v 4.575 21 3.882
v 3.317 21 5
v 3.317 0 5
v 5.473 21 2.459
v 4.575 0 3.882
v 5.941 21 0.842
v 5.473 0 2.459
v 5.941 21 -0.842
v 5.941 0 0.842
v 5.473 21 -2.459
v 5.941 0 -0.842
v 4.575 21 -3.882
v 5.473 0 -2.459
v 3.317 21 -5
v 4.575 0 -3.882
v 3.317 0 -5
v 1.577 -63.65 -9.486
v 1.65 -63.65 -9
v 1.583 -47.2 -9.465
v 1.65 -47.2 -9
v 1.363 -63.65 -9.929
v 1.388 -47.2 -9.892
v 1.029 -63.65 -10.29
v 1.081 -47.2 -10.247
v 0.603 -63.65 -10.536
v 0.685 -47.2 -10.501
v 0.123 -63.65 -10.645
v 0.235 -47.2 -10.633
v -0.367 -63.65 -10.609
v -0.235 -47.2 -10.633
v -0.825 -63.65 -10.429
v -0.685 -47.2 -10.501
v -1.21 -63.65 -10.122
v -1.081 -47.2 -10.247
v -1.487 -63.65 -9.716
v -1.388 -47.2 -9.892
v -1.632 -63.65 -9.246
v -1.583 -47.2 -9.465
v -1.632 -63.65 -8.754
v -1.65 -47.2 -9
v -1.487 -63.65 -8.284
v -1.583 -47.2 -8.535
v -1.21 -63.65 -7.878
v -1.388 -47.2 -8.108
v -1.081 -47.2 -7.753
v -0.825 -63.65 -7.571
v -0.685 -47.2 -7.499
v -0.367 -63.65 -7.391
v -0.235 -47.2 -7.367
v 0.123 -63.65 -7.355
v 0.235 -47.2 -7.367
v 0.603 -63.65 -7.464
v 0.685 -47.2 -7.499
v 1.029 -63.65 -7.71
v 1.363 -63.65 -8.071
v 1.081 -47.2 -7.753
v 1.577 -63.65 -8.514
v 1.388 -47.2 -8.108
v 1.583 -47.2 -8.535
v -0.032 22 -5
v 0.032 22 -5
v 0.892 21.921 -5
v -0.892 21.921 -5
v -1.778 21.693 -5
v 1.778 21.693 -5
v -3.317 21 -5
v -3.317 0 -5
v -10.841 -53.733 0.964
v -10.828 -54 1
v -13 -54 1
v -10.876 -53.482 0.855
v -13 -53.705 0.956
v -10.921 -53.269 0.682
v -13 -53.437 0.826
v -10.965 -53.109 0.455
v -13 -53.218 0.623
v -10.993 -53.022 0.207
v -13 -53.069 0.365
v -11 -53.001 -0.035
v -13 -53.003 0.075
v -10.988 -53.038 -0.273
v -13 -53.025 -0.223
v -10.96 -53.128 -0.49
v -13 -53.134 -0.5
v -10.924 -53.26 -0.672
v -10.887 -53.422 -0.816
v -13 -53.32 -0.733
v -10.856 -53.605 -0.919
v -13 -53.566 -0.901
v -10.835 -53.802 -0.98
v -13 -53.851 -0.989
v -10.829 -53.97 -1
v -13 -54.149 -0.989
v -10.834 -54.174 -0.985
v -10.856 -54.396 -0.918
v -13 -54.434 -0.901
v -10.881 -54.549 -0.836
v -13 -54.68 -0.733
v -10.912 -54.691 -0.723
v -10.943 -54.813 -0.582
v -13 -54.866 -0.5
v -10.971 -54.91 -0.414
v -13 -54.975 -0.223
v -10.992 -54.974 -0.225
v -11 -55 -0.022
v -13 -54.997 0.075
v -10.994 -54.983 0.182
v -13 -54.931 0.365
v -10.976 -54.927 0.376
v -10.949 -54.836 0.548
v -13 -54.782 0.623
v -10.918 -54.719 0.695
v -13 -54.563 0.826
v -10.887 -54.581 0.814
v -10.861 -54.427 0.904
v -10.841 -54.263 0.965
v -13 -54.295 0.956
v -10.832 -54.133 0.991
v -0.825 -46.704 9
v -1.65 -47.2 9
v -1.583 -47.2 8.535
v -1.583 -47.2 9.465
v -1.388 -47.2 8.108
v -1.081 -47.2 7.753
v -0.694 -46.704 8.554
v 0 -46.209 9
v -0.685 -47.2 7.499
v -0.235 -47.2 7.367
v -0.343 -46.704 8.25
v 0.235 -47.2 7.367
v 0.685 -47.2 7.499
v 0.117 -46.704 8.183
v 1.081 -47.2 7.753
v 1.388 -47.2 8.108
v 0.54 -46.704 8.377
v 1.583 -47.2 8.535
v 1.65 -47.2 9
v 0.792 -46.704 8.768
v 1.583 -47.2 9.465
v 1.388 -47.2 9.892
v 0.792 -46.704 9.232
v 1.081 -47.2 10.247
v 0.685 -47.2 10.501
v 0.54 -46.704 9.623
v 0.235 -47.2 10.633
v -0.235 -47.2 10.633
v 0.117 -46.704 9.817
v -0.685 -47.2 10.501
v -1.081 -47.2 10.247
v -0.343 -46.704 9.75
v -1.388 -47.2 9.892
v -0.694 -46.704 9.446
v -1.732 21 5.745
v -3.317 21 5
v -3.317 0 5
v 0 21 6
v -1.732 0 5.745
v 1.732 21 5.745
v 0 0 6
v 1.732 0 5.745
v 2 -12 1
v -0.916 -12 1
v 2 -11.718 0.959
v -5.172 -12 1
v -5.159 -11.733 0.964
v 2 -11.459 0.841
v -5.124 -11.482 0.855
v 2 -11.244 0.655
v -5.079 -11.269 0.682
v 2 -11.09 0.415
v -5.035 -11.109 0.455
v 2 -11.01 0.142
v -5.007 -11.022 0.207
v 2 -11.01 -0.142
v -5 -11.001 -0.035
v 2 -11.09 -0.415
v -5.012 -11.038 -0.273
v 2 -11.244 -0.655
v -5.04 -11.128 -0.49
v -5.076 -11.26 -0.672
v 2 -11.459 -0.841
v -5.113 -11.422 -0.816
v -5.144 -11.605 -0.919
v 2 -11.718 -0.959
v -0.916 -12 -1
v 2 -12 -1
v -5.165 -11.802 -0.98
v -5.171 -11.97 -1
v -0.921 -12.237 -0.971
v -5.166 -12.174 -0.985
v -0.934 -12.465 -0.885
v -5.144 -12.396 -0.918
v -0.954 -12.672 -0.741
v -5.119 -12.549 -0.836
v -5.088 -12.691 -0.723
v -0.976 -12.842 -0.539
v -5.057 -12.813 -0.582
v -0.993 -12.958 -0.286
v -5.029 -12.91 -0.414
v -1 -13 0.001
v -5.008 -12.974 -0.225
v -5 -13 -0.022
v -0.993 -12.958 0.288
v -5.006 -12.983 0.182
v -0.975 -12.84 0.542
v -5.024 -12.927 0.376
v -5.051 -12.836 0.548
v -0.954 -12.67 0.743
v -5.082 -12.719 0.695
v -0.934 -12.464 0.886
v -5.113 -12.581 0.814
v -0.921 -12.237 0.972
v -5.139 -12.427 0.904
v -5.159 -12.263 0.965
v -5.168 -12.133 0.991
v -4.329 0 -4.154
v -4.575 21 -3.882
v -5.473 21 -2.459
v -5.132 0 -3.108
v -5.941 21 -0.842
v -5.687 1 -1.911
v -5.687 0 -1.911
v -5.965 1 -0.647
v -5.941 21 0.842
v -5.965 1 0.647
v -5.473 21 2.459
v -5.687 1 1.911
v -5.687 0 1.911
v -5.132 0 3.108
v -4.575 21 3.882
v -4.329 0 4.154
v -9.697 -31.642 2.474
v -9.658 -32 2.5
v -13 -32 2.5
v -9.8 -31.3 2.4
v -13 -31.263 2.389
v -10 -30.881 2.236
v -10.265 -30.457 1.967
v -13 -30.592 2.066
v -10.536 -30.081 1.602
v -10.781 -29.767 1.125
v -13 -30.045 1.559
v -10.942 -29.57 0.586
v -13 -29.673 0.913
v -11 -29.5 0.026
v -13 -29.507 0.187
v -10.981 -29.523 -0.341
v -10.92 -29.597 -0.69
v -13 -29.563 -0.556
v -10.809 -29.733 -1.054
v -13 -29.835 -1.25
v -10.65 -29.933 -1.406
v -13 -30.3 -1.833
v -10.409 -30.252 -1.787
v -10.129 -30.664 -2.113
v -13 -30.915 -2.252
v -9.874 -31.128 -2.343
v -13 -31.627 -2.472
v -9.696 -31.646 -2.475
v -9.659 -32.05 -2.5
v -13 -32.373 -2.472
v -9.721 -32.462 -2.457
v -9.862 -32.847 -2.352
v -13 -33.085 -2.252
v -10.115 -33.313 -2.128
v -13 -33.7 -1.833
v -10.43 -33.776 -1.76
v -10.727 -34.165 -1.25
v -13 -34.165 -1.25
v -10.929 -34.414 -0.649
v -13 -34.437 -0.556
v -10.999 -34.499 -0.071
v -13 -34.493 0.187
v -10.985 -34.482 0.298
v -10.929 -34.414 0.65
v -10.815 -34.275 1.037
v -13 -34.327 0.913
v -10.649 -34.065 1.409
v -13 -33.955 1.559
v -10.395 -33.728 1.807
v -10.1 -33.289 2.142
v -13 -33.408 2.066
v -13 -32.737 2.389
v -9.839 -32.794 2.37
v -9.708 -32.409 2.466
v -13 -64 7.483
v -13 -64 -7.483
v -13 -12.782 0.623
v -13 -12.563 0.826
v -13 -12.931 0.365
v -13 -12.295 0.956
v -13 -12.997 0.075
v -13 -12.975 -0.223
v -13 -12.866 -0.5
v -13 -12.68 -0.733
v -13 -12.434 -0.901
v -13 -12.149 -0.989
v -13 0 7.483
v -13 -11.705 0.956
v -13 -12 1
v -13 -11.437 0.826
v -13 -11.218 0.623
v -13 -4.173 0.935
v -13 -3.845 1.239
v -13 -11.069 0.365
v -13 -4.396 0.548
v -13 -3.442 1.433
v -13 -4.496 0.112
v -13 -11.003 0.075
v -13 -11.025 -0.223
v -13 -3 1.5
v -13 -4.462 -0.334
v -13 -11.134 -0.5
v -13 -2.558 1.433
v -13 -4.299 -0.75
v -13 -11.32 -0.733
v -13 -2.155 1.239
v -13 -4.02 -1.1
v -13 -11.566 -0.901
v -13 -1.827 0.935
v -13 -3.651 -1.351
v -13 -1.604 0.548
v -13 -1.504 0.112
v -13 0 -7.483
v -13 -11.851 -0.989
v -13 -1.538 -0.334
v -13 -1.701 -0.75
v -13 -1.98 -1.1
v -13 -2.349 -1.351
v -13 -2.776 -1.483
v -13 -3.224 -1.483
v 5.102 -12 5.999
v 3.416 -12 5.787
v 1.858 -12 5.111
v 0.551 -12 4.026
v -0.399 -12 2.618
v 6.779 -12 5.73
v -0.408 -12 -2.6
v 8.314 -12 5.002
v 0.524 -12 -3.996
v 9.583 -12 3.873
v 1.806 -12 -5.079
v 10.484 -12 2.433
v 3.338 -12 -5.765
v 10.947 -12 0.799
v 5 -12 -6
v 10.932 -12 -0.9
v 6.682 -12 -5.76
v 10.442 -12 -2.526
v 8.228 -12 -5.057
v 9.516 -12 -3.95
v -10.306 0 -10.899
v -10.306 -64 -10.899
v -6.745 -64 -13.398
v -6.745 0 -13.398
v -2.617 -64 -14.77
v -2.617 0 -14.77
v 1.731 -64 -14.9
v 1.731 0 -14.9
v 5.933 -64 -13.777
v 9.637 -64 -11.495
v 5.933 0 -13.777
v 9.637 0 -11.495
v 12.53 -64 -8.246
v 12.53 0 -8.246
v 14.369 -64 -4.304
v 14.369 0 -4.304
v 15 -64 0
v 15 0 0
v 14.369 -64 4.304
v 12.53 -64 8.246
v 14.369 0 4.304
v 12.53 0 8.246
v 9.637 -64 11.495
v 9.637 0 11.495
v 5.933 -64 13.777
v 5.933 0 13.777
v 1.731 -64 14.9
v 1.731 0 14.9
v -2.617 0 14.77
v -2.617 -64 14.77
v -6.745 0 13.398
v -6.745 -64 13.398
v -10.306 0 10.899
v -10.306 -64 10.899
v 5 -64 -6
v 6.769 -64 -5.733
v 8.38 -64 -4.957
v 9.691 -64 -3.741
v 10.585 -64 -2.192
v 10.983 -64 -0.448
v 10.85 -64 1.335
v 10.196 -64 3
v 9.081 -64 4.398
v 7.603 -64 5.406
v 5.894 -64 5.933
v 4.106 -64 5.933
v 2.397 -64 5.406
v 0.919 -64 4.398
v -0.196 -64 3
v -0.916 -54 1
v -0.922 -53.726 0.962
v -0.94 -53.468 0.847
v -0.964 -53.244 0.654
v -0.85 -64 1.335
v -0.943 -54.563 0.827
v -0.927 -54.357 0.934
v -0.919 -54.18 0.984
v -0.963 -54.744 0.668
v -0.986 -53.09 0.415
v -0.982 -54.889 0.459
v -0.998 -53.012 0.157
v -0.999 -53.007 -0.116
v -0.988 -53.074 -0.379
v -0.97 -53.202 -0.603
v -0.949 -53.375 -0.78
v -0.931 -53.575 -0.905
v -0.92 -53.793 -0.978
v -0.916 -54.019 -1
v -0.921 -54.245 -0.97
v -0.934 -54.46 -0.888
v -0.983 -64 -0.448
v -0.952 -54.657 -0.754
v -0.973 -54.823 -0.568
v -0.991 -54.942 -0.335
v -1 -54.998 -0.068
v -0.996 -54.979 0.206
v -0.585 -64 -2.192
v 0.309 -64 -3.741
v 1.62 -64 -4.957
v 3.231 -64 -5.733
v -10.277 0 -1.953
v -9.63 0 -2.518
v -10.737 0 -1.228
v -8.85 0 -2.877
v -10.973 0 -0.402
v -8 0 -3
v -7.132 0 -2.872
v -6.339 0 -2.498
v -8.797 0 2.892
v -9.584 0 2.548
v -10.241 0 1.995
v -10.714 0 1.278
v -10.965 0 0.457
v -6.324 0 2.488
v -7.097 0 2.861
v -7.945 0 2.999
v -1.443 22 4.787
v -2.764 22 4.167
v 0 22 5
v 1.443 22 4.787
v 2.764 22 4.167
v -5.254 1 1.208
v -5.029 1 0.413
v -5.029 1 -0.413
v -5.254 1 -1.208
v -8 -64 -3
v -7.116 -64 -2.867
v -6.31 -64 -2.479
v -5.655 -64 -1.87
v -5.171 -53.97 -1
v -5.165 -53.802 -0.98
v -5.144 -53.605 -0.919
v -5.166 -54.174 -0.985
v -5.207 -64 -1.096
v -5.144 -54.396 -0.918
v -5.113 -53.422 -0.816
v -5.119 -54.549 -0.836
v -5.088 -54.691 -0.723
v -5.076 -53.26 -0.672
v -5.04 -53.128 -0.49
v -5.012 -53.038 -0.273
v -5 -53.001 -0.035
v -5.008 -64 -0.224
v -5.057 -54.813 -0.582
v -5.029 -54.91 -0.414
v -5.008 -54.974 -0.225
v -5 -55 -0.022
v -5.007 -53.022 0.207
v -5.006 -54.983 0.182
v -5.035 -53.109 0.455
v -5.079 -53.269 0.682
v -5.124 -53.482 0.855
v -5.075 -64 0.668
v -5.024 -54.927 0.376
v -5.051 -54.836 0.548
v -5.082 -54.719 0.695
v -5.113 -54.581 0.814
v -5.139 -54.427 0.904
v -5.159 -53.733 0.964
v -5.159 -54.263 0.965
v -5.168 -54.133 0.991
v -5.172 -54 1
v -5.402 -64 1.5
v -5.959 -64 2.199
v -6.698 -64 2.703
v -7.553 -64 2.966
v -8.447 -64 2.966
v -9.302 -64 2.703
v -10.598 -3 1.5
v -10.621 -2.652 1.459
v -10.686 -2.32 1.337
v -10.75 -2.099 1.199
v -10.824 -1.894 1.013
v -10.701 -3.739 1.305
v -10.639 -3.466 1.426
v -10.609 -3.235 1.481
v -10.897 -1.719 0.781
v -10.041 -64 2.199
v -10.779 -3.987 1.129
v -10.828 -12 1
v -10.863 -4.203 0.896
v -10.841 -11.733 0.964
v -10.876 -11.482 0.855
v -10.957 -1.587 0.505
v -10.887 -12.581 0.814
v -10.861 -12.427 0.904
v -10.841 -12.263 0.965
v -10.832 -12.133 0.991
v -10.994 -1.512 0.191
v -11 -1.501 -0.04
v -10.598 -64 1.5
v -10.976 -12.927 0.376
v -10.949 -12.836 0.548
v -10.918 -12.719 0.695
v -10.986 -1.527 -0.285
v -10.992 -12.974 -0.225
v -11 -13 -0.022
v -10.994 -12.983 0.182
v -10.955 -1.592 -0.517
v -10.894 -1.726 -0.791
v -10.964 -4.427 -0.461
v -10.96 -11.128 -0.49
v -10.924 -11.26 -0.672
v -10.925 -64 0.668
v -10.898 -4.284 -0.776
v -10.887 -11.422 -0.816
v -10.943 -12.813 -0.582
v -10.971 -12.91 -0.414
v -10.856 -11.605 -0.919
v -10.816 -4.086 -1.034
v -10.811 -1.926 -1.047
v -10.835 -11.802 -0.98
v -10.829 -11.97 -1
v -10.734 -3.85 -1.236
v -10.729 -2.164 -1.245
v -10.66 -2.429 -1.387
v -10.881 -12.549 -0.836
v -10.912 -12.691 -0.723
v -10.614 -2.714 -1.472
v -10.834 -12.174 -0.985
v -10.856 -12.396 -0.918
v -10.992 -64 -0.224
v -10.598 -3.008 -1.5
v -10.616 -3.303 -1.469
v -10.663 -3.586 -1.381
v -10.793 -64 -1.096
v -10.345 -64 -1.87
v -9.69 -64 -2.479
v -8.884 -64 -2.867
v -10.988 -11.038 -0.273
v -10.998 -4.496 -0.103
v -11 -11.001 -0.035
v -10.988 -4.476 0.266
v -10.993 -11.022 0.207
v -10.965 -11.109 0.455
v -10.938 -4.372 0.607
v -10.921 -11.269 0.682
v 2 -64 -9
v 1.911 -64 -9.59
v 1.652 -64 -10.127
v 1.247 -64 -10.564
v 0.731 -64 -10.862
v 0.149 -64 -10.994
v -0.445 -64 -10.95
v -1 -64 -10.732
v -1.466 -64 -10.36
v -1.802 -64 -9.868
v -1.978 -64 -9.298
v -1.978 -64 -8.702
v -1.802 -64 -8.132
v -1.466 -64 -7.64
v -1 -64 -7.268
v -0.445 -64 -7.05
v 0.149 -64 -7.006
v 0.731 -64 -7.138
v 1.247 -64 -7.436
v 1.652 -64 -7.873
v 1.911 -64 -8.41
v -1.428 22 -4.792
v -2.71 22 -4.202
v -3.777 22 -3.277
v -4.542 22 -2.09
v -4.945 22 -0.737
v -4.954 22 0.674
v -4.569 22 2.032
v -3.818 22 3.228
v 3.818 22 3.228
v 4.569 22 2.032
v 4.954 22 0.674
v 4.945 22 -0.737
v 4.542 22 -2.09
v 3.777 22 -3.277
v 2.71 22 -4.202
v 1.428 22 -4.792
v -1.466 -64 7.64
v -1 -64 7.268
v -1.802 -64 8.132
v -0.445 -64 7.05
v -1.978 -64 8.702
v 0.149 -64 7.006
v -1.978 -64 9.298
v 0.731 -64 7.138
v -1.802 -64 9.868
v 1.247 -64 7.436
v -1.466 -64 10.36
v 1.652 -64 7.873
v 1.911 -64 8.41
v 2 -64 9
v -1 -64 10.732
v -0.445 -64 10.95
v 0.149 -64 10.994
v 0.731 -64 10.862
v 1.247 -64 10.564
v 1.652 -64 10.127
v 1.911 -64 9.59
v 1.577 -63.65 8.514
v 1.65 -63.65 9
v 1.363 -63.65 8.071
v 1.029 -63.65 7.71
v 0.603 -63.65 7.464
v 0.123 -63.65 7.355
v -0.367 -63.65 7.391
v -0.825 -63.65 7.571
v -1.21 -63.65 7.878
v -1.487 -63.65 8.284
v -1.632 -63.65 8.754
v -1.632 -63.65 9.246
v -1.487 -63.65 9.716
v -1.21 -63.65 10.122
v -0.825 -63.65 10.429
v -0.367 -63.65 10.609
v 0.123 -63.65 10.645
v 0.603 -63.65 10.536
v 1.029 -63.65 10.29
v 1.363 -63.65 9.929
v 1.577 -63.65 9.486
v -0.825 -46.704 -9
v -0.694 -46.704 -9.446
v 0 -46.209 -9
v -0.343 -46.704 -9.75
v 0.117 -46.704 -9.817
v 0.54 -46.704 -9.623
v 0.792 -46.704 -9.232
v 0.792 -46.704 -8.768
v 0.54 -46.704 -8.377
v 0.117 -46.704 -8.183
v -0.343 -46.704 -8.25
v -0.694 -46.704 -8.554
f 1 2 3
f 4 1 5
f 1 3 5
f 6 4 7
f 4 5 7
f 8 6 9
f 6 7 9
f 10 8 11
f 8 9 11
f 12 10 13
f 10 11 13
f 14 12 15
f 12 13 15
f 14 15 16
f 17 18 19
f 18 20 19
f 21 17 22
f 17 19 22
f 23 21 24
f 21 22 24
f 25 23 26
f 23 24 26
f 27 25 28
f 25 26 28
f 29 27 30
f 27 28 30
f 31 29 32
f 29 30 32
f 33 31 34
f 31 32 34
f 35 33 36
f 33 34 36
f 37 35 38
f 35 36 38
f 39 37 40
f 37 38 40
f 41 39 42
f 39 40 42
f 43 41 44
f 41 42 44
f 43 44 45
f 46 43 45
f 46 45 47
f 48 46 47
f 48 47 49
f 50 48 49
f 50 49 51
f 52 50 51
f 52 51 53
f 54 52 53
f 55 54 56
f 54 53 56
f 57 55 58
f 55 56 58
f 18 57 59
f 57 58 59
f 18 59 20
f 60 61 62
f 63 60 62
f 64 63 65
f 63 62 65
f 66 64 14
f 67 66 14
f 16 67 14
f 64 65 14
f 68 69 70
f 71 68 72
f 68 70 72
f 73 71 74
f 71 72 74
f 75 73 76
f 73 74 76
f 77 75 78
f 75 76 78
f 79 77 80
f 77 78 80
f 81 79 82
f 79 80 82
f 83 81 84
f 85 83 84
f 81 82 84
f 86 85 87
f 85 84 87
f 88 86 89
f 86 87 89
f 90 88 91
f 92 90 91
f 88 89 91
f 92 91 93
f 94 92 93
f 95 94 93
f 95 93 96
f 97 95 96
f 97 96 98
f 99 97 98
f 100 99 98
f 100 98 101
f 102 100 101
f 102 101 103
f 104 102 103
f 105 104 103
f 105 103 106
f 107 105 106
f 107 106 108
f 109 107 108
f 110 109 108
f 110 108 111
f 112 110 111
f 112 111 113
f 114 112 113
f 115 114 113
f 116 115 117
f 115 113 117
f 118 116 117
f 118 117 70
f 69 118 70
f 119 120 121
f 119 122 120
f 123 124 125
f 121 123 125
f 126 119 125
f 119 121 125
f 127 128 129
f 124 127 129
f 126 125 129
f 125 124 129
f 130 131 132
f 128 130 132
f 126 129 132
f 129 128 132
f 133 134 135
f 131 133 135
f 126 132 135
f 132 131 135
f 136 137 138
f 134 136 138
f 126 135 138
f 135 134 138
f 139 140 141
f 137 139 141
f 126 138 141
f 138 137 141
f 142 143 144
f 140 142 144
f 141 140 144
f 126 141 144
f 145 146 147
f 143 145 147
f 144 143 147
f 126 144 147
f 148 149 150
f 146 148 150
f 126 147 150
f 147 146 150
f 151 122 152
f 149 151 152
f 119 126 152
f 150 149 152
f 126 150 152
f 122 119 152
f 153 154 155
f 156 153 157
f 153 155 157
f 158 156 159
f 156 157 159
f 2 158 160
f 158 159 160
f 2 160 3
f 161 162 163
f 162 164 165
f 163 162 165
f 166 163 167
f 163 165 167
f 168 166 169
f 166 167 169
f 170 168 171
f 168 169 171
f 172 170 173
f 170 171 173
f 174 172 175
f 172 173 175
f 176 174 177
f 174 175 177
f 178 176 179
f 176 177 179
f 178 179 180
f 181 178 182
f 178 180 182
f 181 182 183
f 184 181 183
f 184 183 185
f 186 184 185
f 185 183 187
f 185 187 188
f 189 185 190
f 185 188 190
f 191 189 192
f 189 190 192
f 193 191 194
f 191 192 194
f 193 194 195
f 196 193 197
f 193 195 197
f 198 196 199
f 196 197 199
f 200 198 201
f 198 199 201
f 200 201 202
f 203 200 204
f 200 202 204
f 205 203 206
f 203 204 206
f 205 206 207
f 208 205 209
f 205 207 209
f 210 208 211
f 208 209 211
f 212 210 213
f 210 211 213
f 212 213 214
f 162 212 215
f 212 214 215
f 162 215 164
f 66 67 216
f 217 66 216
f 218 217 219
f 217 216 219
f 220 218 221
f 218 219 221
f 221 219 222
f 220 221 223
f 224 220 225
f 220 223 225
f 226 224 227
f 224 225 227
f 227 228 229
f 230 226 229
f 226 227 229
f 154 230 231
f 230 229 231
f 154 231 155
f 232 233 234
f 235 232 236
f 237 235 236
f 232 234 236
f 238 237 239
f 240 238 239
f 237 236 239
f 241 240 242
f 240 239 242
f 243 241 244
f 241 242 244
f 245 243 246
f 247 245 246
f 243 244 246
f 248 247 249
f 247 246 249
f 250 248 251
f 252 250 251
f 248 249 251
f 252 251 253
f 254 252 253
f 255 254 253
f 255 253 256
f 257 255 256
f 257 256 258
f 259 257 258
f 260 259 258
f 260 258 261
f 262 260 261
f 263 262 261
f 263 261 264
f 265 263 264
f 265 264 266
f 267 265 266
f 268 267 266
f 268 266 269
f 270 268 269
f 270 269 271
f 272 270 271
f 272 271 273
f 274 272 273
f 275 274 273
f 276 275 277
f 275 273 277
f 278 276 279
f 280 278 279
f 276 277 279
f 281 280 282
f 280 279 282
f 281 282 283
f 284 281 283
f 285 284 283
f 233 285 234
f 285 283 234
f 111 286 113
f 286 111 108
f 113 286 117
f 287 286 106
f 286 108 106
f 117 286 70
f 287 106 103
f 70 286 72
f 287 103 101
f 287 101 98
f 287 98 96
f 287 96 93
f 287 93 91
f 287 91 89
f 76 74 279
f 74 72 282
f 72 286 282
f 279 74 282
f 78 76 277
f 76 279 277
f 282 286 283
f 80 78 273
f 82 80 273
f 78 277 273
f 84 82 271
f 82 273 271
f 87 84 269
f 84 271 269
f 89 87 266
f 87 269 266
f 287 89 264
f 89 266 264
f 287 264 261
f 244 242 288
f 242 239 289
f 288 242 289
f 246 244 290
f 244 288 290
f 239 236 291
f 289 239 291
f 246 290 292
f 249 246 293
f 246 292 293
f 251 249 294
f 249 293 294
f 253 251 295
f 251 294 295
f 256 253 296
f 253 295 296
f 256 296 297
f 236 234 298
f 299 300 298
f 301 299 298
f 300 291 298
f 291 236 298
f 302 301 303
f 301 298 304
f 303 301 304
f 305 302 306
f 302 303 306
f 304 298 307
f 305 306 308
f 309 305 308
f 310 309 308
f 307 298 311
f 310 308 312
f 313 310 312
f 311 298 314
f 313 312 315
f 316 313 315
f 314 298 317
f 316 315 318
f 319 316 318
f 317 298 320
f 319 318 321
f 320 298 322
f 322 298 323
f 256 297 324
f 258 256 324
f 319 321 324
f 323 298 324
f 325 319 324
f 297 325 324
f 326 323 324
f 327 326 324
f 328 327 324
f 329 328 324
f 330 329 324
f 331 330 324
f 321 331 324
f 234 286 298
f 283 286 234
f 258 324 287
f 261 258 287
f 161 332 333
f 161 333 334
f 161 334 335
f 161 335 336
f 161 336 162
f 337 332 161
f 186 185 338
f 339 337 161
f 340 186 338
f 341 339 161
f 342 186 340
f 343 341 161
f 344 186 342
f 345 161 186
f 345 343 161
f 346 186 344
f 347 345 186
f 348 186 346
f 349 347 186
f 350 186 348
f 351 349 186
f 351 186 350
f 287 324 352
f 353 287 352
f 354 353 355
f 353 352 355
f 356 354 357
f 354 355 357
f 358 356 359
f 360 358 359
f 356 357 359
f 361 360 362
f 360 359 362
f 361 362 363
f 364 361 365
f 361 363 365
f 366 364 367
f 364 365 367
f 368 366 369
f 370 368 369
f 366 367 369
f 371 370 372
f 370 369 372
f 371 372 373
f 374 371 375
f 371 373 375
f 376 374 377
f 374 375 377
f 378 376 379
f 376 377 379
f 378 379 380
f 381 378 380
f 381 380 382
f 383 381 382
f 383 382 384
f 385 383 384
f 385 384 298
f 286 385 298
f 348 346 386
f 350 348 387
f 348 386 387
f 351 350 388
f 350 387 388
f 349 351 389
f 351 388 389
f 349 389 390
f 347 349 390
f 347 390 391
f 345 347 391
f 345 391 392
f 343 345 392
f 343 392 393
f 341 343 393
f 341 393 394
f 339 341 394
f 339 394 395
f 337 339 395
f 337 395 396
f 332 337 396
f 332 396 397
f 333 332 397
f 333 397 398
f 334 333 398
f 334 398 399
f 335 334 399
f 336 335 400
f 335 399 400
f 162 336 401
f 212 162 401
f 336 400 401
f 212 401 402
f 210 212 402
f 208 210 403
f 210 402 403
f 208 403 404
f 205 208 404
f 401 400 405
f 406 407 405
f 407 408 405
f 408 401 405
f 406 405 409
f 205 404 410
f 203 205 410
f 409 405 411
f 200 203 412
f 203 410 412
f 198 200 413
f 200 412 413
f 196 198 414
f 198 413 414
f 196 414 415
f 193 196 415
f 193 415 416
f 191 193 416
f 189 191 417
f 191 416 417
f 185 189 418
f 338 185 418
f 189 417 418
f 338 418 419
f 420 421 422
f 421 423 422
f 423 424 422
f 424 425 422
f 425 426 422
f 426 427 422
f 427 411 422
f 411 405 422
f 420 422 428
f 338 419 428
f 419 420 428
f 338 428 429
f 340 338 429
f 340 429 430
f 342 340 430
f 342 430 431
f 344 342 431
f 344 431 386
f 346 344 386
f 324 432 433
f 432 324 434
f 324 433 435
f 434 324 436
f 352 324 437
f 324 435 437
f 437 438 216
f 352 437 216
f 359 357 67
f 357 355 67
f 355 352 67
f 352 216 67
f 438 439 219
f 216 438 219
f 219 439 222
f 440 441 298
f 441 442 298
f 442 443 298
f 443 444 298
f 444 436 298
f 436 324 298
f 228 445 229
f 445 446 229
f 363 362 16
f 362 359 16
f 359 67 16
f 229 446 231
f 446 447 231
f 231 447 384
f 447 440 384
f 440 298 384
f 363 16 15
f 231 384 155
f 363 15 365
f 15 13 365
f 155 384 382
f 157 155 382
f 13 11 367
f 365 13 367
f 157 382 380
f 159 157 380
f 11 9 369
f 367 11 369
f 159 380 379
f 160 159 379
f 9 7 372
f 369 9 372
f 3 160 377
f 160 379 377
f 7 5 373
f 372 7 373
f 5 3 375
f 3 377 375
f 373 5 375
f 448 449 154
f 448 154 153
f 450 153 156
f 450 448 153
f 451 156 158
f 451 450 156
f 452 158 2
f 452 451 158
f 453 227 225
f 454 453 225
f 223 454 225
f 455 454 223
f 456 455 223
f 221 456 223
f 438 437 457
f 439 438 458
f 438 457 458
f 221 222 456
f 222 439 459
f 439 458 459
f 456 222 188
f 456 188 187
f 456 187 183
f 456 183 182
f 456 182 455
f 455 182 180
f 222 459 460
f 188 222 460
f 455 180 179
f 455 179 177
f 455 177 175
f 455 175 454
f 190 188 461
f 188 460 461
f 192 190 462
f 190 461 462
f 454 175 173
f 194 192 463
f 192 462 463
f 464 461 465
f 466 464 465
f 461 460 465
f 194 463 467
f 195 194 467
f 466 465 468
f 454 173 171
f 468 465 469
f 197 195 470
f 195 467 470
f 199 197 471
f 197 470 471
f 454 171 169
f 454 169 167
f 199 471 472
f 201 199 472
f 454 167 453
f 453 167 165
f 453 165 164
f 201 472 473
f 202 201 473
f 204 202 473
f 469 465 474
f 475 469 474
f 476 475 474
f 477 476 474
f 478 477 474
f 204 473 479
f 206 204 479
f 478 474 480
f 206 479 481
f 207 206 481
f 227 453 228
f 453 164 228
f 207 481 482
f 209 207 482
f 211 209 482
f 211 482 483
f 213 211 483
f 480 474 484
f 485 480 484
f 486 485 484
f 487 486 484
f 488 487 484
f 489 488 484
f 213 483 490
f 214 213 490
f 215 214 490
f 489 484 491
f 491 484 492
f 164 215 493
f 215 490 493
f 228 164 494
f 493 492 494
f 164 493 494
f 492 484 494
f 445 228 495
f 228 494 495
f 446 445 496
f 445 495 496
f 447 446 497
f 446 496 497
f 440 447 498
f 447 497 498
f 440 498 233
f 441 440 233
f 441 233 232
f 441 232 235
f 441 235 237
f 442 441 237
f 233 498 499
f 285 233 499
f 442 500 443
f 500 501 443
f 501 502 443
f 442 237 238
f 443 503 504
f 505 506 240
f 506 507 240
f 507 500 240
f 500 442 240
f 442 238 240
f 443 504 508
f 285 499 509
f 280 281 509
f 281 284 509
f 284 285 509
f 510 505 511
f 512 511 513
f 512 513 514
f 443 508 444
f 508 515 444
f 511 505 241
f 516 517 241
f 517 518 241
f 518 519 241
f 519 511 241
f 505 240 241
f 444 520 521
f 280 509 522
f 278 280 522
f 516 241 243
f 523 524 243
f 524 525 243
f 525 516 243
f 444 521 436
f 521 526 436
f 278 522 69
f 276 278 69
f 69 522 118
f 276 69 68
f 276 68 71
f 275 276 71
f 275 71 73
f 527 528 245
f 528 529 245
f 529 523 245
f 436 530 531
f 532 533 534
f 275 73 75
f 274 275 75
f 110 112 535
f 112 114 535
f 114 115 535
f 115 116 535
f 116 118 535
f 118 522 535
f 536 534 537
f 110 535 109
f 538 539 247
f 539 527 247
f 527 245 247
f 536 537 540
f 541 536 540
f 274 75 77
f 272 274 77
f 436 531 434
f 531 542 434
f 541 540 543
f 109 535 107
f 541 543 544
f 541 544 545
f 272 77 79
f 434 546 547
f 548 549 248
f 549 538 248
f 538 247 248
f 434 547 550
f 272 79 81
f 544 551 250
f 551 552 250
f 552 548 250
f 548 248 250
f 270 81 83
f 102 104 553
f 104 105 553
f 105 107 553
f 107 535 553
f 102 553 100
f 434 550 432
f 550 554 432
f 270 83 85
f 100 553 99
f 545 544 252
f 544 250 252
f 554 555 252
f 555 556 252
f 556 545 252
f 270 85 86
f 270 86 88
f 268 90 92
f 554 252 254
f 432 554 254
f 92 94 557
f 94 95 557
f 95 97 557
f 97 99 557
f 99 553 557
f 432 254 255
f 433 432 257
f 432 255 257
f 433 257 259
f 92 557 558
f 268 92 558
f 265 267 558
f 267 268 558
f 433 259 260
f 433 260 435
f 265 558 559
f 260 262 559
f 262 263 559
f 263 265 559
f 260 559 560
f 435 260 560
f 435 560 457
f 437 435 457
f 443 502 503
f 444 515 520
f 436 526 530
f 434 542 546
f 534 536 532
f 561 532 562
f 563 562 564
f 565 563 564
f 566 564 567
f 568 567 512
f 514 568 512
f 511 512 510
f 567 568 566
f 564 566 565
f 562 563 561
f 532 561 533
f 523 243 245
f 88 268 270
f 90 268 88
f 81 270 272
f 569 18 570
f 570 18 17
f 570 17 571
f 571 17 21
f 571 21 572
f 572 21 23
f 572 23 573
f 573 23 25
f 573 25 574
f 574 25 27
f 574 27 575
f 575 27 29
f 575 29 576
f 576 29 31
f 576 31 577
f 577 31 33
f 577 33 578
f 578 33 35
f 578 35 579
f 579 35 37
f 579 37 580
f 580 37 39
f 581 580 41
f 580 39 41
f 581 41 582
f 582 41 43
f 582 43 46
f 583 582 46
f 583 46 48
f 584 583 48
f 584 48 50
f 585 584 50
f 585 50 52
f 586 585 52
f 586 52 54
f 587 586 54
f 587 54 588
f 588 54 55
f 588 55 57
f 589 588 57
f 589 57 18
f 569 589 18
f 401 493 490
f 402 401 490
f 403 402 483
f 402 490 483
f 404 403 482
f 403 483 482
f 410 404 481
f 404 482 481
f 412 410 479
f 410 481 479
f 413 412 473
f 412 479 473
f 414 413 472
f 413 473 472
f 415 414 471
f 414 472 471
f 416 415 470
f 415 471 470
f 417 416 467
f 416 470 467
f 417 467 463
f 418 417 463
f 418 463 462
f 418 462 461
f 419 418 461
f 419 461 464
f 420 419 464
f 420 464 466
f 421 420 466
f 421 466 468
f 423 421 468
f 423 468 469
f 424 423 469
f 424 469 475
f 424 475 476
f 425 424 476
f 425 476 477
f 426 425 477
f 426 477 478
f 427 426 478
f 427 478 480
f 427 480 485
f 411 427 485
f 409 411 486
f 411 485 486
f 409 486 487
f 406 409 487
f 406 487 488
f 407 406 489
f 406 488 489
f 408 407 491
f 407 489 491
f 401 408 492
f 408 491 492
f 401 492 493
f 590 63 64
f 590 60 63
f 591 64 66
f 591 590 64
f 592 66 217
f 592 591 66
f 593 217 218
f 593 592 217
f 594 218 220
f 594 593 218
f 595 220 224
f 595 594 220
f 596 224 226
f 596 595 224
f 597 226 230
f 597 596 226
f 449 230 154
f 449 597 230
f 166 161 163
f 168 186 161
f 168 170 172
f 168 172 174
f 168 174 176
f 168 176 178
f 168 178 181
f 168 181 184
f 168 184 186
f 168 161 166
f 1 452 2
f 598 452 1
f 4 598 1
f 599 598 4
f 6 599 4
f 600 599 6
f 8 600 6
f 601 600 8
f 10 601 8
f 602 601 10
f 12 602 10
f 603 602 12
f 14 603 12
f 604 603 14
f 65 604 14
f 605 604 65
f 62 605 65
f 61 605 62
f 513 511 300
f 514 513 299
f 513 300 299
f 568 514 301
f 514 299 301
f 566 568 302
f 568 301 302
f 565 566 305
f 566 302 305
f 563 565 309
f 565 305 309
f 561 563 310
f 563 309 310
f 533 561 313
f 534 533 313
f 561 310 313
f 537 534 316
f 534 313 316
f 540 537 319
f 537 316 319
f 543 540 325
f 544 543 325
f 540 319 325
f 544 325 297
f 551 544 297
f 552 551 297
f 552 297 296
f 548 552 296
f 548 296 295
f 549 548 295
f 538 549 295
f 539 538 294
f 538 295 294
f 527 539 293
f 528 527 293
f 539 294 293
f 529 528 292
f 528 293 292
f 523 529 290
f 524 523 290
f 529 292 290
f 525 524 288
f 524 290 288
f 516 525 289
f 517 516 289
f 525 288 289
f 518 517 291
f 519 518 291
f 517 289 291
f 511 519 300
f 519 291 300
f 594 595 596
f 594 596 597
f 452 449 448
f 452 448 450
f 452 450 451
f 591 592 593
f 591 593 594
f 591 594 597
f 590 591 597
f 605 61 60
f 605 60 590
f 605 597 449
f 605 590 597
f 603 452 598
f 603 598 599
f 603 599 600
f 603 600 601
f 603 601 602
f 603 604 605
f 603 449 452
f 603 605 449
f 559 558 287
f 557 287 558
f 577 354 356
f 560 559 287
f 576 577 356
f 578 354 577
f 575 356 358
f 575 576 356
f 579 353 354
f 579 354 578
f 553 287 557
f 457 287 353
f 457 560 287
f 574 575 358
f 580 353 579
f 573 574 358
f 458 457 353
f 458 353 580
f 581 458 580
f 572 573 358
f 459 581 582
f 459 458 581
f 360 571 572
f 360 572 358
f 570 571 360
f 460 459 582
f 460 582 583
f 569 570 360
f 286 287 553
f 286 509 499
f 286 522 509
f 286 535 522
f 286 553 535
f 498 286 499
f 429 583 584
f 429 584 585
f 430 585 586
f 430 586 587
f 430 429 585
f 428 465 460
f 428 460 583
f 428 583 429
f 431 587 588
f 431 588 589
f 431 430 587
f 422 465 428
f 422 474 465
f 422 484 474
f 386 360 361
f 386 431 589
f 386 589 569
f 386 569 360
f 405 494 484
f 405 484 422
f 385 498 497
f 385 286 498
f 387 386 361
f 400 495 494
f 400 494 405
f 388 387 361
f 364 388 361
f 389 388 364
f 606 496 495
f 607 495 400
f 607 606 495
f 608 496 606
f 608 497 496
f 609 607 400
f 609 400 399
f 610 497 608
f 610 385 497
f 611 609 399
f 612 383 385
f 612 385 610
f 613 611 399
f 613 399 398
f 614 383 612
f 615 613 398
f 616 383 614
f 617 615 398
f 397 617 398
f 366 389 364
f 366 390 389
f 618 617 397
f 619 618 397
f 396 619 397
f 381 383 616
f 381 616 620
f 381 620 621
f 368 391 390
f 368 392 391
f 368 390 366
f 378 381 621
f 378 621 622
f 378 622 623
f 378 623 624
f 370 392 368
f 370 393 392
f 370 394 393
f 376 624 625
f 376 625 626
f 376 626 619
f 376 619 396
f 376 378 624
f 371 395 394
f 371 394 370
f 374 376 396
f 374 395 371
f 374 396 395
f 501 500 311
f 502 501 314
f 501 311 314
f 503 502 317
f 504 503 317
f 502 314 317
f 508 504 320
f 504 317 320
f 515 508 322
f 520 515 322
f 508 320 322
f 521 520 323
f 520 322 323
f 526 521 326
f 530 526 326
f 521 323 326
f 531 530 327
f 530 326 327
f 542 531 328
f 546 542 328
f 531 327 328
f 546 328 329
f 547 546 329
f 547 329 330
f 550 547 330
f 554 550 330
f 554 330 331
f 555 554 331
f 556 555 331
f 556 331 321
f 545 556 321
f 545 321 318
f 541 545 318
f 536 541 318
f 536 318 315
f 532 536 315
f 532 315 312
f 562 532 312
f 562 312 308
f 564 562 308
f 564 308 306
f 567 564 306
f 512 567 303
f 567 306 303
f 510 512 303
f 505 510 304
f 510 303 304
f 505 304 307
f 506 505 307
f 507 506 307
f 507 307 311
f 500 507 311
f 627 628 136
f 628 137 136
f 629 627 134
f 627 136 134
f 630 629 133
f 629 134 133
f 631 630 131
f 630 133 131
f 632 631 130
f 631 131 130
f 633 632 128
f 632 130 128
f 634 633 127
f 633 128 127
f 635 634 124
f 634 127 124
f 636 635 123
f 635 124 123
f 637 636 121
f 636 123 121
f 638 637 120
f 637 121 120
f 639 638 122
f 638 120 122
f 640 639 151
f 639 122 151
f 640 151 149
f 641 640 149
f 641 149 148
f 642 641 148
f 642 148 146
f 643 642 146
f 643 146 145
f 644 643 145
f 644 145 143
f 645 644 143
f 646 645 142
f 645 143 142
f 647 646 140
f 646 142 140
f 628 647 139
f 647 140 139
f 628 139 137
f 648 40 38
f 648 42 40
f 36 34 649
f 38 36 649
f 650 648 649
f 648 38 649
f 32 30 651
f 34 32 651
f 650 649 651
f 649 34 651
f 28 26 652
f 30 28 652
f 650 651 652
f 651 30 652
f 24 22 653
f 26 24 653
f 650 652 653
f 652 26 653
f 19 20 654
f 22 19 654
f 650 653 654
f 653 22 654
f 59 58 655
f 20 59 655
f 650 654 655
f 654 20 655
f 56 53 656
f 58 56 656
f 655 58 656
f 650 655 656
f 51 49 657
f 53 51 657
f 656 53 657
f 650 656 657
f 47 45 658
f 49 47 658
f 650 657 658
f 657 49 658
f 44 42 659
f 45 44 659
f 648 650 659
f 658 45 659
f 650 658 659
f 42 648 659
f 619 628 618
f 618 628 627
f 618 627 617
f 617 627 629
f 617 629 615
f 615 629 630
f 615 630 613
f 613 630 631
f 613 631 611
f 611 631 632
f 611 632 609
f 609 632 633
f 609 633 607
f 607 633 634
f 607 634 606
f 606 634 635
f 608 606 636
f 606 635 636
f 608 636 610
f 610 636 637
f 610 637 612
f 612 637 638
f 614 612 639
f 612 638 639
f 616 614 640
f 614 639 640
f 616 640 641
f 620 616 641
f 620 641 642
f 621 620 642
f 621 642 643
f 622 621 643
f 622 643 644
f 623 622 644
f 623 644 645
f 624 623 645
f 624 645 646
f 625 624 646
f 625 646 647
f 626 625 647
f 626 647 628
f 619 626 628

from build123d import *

# Parameters (mm, degrees)
BOSS_EXTRUDE1_DEPTH         = 22
BOSS_EXTRUDE2_DEPTH         = 64
SKETCH3_R                   = 3
CUT_EXTRUDE1_DEPTH          = 65
SKETCH4_R                   = 6
CUT_EXTRUDE2_DEPTH          = 52
M4_TAPPED_HOLE2_D           = 3.3
M4_TAPPED_HOLE2_DEPTH       = 16.8
M4_TAPPED_HOLE2_CSINK_D     = 4
M4_TAPPED_HOLE2_CSINK_ANGLE = 90
M4_TAPPED_HOLE2_TIP         = 0.991420021
SKETCH20_R                  = 2.5
SKETCH20_R_2                = 1.5
CUT_EXTRUDE3_DEPTH          = 5
SKETCH21_R                  = 1
CUT_EXTRUDE4_DEPTH          = 15
BOSS_EXTRUDE4_START         = -22
BOSS_EXTRUDE4_DEPTH         = 22
CUT_EXTRUDE5_DEPTH          = 22
CHAMFER1_SIZE               = 1


with BuildPart() as part:
    # Sketch1 → Boss-Extrude1 (new body)
    with BuildSketch(Plane(origin=(0, 0, 0), x_dir=(1, 0, 0), z_dir=(0, 1, 0))):
        with BuildLine():
            Line((-3.31662479, -5), (3.31662479, -5))
            ThreePointArc((3.31662479, -5), (0, 6), (-3.31662479, -5))
        make_face()
    extrude(amount=BOSS_EXTRUDE1_DEPTH)

    # Sketch2 → Boss-Extrude2 (add)
    with BuildSketch(Plane.XZ):
        with BuildLine():
            Line((-13, 7.483314774), (-13, -7.483314774))
            ThreePointArc((-13, -7.483314774), (15, 0), (-13, 7.483314774))
        make_face()
    extrude(amount=BOSS_EXTRUDE2_DEPTH)

    # Sketch3 → Cut-Extrude1 (cut)
    with BuildSketch(Plane.XZ.offset(64)):
        with Locations(Location((-8, 0, 0), (0, 0, 270))):
            Circle(SKETCH3_R)
    extrude(amount=-CUT_EXTRUDE1_DEPTH, mode=Mode.SUBTRACT)

    # Sketch4 → Cut-Extrude2 (cut)
    with BuildSketch(Plane(origin=(0, -64, 0), x_dir=(-1, 0, 0), z_dir=(0, -1, 0))):
        with Locations(Location((-5, 0, 0), (0, 0, 90))):
            Circle(SKETCH4_R)
    extrude(amount=-CUT_EXTRUDE2_DEPTH, mode=Mode.SUBTRACT)

    # M4 Tapped Hole2
    with Locations(Plane(origin=(0, -64, 0), x_dir=(-1, 0, 0), z_dir=(0, -1, 0))):
        with Locations((0, -9), (0, 9)):
            CounterSinkHole(M4_TAPPED_HOLE2_D / 2, M4_TAPPED_HOLE2_CSINK_D / 2, depth=M4_TAPPED_HOLE2_DEPTH, counter_sink_angle=M4_TAPPED_HOLE2_CSINK_ANGLE)
            with Locations((0, 0, -(M4_TAPPED_HOLE2_DEPTH + M4_TAPPED_HOLE2_TIP / 2))):  # 118° drill point
                Cone(0, M4_TAPPED_HOLE2_D / 2, M4_TAPPED_HOLE2_TIP, mode=Mode.SUBTRACT)

    # Sketch20 → Cut-Extrude3 (cut)
    with BuildSketch(Plane.ZY.offset(13)):
        with Locations((0, -32)):
            Circle(SKETCH20_R)
        with Locations((0, -3)):
            Circle(SKETCH20_R_2)
    extrude(amount=-CUT_EXTRUDE3_DEPTH, mode=Mode.SUBTRACT)

    # Sketch21 → Cut-Extrude4 (cut)
    with BuildSketch(Plane.ZY.offset(13)):
        with Locations((0, -12)):
            Circle(SKETCH21_R)
        with Locations((0, -54)):
            Circle(SKETCH21_R)
    extrude(amount=-CUT_EXTRUDE4_DEPTH, mode=Mode.SUBTRACT)

    # Sketch22 → Boss-Extrude4 (add)
    with BuildSketch(Plane(origin=(0, 22, 0), x_dir=(1, 0, 0), z_dir=(0, 1, 0)).offset(BOSS_EXTRUDE4_START)):
        with BuildLine():
            Line((3.31662479, -5), (-3.31662479, -5))
            ThreePointArc((-3.31662479, -5), (0, -6), (3.31662479, -5))
        make_face()
    extrude(amount=BOSS_EXTRUDE4_DEPTH)

    # Sketch23 → Cut-Extrude5 (cut)
    with BuildSketch(Plane(origin=(0, 22, 0), x_dir=(1, 0, 0), z_dir=(0, 1, 0))):
        Polygon((-67.556784956, 5), (-3.31662479, 5), (3.31662479, 5), (67.556784956, 5), (67.556784956, 133.480320332), (-67.556784956, 133.480320332), align=None)
    extrude(amount=-CUT_EXTRUDE5_DEPTH, mode=Mode.SUBTRACT)

    # Chamfer1
    chamfer1_edges = [part.edges().sort_by_distance(p)[0] for p in [
        (0, 22, 6),
    ]]
    chamfer(chamfer1_edges, length=CHAMFER1_SIZE - 0.0001)  # a hair under: the kernel refuses the full size


solid = part.part
